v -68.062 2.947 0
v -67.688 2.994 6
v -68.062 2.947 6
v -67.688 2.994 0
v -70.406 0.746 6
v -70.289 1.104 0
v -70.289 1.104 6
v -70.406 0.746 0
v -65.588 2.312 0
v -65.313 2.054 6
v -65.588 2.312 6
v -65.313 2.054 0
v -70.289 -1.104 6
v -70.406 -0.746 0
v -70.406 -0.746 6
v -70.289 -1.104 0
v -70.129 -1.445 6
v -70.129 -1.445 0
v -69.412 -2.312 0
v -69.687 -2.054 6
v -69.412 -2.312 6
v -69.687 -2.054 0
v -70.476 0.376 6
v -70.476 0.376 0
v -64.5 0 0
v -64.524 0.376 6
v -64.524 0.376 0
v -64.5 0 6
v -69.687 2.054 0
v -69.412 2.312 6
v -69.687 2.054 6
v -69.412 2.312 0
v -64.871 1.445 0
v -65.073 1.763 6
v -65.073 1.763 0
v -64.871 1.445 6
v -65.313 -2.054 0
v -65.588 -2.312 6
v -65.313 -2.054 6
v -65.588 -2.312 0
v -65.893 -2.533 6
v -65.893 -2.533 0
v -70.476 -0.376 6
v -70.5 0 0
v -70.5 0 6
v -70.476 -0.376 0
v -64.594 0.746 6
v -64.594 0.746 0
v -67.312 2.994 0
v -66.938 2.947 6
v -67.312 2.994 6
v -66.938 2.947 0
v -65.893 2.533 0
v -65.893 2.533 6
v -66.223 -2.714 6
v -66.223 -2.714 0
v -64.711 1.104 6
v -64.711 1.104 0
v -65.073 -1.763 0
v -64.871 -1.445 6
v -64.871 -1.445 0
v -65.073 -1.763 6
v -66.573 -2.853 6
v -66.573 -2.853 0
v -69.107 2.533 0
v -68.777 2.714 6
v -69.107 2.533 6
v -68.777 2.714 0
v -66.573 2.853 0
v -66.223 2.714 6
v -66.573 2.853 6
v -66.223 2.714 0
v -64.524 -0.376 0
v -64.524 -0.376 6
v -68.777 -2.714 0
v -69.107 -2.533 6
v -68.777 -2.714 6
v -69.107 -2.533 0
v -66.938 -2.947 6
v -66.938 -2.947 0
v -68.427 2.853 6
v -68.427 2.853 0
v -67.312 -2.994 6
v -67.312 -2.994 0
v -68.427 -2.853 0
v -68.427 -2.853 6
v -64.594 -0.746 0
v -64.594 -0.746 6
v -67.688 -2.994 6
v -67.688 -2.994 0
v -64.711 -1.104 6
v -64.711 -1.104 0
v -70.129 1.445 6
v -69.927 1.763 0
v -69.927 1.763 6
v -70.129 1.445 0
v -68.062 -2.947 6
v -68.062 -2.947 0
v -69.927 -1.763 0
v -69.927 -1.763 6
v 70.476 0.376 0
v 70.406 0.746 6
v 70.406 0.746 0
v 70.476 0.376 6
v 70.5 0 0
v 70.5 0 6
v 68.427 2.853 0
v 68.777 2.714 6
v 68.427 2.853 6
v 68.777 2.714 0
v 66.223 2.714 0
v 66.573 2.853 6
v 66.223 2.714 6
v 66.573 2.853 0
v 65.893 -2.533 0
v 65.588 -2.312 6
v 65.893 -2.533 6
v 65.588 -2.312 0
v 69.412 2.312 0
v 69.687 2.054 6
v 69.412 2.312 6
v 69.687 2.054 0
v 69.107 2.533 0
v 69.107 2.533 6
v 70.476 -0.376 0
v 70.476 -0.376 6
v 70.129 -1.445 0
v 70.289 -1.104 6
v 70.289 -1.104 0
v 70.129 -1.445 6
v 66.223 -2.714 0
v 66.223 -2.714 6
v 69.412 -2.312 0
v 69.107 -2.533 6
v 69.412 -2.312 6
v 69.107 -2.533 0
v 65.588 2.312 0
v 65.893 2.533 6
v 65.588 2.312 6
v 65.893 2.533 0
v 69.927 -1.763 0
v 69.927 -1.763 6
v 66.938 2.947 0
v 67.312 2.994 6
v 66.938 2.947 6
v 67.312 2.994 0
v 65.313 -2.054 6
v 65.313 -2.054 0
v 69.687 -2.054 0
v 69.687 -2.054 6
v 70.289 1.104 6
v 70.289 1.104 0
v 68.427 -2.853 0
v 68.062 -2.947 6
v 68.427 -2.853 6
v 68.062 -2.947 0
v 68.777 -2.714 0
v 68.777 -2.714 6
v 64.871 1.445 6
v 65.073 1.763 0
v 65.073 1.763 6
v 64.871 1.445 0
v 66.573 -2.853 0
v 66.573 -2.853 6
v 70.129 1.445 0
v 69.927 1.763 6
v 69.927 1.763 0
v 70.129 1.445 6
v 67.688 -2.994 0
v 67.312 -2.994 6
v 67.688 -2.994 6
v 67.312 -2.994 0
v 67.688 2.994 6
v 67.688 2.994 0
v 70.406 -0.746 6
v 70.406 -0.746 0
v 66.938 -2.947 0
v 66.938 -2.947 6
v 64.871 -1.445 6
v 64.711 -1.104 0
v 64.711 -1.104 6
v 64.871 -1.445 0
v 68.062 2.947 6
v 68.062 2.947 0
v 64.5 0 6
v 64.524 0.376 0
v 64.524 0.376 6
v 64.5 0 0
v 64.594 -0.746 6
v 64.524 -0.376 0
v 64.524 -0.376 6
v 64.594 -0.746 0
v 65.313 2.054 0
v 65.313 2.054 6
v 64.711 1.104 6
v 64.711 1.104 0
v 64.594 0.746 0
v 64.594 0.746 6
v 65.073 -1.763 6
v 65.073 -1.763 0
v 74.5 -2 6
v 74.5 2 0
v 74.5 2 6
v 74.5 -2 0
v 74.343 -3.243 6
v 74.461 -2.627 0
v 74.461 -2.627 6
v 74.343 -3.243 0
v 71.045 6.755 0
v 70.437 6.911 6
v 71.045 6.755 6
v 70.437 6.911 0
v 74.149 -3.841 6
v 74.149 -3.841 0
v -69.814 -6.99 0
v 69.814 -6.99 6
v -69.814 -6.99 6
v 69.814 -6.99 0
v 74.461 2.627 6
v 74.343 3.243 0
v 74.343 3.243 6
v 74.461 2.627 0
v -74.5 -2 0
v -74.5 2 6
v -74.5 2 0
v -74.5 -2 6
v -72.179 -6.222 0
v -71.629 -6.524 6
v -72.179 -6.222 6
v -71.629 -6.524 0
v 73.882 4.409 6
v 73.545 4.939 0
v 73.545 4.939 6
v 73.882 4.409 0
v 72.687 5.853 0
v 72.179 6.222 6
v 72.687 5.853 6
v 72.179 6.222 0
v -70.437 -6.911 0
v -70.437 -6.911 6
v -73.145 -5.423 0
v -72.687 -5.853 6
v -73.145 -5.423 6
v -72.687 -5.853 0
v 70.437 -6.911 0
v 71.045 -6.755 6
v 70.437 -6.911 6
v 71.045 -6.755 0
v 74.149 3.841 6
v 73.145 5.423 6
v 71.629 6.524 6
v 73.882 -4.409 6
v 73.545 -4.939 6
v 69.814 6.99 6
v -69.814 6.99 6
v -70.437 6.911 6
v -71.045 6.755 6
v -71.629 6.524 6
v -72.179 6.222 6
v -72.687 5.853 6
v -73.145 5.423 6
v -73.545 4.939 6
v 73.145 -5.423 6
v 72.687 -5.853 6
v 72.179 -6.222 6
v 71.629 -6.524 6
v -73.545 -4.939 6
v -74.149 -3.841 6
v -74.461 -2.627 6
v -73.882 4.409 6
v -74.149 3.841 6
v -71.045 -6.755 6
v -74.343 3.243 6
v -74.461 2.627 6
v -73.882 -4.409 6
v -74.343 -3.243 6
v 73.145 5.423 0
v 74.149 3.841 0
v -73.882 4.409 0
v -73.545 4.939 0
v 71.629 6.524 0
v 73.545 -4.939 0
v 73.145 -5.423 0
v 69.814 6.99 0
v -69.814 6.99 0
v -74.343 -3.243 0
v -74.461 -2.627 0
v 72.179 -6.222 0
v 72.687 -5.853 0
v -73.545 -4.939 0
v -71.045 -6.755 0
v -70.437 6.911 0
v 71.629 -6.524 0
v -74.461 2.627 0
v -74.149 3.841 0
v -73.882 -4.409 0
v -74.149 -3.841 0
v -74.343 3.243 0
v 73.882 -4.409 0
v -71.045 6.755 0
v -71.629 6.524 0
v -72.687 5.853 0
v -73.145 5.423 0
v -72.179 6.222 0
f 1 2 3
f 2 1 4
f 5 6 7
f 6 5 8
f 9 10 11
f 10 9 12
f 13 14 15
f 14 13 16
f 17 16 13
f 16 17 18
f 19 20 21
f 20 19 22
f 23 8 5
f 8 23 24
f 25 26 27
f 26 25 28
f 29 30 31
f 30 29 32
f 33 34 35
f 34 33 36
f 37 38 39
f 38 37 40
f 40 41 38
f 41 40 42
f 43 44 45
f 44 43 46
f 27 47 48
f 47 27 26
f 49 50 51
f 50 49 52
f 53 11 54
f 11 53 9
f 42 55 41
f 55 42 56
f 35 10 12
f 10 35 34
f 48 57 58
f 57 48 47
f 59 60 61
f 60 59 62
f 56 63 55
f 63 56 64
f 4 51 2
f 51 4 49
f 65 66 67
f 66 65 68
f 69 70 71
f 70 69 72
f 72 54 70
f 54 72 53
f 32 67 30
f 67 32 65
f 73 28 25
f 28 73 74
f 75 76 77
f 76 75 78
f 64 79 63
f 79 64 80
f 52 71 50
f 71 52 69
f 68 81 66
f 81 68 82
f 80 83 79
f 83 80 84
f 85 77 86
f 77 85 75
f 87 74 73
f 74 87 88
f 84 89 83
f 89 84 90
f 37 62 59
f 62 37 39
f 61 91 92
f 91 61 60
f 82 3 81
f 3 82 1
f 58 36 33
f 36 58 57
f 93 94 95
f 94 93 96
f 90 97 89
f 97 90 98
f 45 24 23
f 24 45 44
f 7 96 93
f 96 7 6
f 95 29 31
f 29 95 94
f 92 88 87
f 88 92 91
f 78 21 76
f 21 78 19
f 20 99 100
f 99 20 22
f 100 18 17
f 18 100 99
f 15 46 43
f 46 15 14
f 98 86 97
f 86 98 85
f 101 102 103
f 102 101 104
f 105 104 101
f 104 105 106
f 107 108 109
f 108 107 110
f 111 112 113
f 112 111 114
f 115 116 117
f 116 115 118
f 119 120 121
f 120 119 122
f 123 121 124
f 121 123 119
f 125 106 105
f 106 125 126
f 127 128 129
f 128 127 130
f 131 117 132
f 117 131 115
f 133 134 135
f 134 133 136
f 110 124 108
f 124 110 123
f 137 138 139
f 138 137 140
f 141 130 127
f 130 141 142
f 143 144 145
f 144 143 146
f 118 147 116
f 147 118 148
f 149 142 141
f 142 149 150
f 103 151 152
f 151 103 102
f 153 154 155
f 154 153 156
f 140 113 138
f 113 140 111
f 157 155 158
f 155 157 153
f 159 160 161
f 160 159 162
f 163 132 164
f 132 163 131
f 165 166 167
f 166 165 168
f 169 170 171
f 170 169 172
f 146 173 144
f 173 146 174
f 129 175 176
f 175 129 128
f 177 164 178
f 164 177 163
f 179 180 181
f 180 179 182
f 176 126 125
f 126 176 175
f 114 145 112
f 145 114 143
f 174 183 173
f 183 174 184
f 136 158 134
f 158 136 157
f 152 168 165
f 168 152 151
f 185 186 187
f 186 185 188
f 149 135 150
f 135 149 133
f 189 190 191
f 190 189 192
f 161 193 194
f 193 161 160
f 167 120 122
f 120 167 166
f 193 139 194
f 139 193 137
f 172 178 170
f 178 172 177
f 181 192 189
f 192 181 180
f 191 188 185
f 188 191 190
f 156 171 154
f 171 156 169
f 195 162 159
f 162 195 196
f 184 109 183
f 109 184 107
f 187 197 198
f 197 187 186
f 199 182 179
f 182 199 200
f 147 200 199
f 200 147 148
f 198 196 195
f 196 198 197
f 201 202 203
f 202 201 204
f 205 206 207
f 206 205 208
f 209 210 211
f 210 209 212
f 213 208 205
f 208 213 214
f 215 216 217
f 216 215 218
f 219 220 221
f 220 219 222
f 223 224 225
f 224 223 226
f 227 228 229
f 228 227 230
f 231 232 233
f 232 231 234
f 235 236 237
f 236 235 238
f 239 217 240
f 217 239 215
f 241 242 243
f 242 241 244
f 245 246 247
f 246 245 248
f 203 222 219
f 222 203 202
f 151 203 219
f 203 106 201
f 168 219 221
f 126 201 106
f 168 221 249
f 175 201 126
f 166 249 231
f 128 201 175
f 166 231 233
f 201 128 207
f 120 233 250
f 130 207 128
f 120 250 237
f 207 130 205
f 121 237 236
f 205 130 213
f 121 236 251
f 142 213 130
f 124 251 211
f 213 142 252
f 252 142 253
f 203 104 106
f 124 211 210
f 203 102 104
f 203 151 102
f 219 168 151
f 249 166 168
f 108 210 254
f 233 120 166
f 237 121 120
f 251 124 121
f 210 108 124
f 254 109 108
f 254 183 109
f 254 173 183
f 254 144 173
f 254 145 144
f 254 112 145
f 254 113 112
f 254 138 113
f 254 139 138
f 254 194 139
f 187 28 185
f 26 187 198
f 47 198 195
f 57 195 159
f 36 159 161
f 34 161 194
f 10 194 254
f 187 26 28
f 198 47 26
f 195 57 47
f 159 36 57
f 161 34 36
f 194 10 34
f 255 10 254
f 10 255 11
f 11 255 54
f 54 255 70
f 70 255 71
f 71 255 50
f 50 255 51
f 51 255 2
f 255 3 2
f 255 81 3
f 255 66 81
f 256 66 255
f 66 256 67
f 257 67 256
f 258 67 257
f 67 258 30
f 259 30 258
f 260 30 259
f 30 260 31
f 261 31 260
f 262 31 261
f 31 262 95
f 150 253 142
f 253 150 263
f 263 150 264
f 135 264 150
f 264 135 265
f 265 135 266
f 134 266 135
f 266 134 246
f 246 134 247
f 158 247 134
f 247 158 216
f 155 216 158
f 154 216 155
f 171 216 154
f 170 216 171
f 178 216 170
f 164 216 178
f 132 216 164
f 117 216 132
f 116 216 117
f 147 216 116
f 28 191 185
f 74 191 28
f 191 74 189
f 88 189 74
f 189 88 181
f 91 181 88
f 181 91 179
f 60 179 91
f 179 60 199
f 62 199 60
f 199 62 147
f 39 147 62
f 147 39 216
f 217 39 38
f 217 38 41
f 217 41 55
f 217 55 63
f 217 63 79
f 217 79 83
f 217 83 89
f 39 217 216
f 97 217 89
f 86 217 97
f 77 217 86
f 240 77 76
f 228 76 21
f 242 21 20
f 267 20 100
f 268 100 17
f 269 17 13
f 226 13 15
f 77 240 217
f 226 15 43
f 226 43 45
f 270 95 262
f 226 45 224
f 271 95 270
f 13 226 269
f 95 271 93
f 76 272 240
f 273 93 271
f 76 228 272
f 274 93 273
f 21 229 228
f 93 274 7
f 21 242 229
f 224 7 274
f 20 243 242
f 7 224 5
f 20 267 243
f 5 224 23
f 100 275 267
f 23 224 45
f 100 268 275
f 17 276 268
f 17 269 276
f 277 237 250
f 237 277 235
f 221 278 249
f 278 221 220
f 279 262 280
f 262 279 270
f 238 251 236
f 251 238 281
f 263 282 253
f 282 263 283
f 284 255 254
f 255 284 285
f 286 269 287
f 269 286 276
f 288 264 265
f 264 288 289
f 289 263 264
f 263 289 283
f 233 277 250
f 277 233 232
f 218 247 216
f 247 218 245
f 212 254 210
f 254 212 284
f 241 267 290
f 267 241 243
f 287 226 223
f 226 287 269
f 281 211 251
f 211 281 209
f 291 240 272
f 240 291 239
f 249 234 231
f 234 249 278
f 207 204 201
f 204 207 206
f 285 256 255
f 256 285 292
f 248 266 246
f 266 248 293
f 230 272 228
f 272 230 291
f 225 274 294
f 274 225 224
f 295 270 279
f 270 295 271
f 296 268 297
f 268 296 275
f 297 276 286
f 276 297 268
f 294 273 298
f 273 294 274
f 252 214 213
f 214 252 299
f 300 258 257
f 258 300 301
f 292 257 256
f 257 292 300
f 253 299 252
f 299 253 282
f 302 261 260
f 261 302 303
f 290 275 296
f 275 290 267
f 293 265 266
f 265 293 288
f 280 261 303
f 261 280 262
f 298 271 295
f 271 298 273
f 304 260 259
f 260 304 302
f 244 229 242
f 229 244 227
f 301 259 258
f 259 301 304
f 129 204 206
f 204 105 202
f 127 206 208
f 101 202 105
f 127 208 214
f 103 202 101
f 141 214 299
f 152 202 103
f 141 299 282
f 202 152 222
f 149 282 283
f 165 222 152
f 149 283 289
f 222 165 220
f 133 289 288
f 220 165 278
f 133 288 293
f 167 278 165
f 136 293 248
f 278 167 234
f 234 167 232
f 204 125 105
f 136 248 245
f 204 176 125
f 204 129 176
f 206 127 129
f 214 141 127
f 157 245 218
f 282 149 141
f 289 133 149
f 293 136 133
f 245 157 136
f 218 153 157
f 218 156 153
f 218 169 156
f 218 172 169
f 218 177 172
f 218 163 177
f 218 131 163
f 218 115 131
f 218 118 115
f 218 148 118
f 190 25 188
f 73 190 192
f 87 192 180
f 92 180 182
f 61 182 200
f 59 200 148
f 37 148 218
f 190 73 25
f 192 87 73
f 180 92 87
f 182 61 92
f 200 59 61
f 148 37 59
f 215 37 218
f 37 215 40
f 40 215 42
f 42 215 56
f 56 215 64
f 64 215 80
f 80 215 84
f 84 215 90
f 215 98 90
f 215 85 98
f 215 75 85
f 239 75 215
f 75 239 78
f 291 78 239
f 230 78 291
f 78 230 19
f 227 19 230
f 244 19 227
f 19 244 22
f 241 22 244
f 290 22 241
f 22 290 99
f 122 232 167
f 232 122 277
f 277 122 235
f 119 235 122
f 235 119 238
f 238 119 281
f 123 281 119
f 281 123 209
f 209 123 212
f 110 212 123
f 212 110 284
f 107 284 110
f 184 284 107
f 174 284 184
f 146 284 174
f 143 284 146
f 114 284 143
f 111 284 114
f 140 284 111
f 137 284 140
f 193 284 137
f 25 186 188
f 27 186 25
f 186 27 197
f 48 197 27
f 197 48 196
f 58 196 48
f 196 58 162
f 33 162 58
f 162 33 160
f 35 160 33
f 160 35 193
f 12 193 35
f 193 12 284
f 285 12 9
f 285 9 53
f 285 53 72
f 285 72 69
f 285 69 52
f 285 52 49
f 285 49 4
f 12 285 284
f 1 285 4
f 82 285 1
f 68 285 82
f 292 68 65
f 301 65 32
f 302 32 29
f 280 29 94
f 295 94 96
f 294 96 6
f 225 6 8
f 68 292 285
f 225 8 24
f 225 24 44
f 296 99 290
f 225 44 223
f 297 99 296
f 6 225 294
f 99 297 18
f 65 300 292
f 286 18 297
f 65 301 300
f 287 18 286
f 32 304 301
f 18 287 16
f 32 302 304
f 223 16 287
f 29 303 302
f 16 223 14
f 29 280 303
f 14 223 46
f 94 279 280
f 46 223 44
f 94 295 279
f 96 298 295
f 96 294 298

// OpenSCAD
$fn = 50;


difference() {
	union() {
		hull() {
			translate(v = [-69.5000000000, 2.0000000000, 0]) {
				cylinder(h = 6, r = 5);
			}
			translate(v = [69.5000000000, 2.0000000000, 0]) {
				cylinder(h = 6, r = 5);
			}
			translate(v = [-69.5000000000, -2.0000000000, 0]) {
				cylinder(h = 6, r = 5);
			}
			translate(v = [69.5000000000, -2.0000000000, 0]) {
				cylinder(h = 6, r = 5);
			}
		}
	}
	union() {
		translate(v = [-67.5000000000, 0.0000000000, -100.0000000000]) {
			cylinder(h = 200, r = 3.0000000000);
		}
		translate(v = [-67.5000000000, 0.0000000000, -100.0000000000]) {
			cylinder(h = 200, r = 3.0000000000);
		}
		translate(v = [67.5000000000, 0.0000000000, -100.0000000000]) {
			cylinder(h = 200, r = 3.0000000000);
		}
		translate(v = [67.5000000000, 0.0000000000, -100.0000000000]) {
			cylinder(h = 200, r = 3.0000000000);
		}
	}
}
